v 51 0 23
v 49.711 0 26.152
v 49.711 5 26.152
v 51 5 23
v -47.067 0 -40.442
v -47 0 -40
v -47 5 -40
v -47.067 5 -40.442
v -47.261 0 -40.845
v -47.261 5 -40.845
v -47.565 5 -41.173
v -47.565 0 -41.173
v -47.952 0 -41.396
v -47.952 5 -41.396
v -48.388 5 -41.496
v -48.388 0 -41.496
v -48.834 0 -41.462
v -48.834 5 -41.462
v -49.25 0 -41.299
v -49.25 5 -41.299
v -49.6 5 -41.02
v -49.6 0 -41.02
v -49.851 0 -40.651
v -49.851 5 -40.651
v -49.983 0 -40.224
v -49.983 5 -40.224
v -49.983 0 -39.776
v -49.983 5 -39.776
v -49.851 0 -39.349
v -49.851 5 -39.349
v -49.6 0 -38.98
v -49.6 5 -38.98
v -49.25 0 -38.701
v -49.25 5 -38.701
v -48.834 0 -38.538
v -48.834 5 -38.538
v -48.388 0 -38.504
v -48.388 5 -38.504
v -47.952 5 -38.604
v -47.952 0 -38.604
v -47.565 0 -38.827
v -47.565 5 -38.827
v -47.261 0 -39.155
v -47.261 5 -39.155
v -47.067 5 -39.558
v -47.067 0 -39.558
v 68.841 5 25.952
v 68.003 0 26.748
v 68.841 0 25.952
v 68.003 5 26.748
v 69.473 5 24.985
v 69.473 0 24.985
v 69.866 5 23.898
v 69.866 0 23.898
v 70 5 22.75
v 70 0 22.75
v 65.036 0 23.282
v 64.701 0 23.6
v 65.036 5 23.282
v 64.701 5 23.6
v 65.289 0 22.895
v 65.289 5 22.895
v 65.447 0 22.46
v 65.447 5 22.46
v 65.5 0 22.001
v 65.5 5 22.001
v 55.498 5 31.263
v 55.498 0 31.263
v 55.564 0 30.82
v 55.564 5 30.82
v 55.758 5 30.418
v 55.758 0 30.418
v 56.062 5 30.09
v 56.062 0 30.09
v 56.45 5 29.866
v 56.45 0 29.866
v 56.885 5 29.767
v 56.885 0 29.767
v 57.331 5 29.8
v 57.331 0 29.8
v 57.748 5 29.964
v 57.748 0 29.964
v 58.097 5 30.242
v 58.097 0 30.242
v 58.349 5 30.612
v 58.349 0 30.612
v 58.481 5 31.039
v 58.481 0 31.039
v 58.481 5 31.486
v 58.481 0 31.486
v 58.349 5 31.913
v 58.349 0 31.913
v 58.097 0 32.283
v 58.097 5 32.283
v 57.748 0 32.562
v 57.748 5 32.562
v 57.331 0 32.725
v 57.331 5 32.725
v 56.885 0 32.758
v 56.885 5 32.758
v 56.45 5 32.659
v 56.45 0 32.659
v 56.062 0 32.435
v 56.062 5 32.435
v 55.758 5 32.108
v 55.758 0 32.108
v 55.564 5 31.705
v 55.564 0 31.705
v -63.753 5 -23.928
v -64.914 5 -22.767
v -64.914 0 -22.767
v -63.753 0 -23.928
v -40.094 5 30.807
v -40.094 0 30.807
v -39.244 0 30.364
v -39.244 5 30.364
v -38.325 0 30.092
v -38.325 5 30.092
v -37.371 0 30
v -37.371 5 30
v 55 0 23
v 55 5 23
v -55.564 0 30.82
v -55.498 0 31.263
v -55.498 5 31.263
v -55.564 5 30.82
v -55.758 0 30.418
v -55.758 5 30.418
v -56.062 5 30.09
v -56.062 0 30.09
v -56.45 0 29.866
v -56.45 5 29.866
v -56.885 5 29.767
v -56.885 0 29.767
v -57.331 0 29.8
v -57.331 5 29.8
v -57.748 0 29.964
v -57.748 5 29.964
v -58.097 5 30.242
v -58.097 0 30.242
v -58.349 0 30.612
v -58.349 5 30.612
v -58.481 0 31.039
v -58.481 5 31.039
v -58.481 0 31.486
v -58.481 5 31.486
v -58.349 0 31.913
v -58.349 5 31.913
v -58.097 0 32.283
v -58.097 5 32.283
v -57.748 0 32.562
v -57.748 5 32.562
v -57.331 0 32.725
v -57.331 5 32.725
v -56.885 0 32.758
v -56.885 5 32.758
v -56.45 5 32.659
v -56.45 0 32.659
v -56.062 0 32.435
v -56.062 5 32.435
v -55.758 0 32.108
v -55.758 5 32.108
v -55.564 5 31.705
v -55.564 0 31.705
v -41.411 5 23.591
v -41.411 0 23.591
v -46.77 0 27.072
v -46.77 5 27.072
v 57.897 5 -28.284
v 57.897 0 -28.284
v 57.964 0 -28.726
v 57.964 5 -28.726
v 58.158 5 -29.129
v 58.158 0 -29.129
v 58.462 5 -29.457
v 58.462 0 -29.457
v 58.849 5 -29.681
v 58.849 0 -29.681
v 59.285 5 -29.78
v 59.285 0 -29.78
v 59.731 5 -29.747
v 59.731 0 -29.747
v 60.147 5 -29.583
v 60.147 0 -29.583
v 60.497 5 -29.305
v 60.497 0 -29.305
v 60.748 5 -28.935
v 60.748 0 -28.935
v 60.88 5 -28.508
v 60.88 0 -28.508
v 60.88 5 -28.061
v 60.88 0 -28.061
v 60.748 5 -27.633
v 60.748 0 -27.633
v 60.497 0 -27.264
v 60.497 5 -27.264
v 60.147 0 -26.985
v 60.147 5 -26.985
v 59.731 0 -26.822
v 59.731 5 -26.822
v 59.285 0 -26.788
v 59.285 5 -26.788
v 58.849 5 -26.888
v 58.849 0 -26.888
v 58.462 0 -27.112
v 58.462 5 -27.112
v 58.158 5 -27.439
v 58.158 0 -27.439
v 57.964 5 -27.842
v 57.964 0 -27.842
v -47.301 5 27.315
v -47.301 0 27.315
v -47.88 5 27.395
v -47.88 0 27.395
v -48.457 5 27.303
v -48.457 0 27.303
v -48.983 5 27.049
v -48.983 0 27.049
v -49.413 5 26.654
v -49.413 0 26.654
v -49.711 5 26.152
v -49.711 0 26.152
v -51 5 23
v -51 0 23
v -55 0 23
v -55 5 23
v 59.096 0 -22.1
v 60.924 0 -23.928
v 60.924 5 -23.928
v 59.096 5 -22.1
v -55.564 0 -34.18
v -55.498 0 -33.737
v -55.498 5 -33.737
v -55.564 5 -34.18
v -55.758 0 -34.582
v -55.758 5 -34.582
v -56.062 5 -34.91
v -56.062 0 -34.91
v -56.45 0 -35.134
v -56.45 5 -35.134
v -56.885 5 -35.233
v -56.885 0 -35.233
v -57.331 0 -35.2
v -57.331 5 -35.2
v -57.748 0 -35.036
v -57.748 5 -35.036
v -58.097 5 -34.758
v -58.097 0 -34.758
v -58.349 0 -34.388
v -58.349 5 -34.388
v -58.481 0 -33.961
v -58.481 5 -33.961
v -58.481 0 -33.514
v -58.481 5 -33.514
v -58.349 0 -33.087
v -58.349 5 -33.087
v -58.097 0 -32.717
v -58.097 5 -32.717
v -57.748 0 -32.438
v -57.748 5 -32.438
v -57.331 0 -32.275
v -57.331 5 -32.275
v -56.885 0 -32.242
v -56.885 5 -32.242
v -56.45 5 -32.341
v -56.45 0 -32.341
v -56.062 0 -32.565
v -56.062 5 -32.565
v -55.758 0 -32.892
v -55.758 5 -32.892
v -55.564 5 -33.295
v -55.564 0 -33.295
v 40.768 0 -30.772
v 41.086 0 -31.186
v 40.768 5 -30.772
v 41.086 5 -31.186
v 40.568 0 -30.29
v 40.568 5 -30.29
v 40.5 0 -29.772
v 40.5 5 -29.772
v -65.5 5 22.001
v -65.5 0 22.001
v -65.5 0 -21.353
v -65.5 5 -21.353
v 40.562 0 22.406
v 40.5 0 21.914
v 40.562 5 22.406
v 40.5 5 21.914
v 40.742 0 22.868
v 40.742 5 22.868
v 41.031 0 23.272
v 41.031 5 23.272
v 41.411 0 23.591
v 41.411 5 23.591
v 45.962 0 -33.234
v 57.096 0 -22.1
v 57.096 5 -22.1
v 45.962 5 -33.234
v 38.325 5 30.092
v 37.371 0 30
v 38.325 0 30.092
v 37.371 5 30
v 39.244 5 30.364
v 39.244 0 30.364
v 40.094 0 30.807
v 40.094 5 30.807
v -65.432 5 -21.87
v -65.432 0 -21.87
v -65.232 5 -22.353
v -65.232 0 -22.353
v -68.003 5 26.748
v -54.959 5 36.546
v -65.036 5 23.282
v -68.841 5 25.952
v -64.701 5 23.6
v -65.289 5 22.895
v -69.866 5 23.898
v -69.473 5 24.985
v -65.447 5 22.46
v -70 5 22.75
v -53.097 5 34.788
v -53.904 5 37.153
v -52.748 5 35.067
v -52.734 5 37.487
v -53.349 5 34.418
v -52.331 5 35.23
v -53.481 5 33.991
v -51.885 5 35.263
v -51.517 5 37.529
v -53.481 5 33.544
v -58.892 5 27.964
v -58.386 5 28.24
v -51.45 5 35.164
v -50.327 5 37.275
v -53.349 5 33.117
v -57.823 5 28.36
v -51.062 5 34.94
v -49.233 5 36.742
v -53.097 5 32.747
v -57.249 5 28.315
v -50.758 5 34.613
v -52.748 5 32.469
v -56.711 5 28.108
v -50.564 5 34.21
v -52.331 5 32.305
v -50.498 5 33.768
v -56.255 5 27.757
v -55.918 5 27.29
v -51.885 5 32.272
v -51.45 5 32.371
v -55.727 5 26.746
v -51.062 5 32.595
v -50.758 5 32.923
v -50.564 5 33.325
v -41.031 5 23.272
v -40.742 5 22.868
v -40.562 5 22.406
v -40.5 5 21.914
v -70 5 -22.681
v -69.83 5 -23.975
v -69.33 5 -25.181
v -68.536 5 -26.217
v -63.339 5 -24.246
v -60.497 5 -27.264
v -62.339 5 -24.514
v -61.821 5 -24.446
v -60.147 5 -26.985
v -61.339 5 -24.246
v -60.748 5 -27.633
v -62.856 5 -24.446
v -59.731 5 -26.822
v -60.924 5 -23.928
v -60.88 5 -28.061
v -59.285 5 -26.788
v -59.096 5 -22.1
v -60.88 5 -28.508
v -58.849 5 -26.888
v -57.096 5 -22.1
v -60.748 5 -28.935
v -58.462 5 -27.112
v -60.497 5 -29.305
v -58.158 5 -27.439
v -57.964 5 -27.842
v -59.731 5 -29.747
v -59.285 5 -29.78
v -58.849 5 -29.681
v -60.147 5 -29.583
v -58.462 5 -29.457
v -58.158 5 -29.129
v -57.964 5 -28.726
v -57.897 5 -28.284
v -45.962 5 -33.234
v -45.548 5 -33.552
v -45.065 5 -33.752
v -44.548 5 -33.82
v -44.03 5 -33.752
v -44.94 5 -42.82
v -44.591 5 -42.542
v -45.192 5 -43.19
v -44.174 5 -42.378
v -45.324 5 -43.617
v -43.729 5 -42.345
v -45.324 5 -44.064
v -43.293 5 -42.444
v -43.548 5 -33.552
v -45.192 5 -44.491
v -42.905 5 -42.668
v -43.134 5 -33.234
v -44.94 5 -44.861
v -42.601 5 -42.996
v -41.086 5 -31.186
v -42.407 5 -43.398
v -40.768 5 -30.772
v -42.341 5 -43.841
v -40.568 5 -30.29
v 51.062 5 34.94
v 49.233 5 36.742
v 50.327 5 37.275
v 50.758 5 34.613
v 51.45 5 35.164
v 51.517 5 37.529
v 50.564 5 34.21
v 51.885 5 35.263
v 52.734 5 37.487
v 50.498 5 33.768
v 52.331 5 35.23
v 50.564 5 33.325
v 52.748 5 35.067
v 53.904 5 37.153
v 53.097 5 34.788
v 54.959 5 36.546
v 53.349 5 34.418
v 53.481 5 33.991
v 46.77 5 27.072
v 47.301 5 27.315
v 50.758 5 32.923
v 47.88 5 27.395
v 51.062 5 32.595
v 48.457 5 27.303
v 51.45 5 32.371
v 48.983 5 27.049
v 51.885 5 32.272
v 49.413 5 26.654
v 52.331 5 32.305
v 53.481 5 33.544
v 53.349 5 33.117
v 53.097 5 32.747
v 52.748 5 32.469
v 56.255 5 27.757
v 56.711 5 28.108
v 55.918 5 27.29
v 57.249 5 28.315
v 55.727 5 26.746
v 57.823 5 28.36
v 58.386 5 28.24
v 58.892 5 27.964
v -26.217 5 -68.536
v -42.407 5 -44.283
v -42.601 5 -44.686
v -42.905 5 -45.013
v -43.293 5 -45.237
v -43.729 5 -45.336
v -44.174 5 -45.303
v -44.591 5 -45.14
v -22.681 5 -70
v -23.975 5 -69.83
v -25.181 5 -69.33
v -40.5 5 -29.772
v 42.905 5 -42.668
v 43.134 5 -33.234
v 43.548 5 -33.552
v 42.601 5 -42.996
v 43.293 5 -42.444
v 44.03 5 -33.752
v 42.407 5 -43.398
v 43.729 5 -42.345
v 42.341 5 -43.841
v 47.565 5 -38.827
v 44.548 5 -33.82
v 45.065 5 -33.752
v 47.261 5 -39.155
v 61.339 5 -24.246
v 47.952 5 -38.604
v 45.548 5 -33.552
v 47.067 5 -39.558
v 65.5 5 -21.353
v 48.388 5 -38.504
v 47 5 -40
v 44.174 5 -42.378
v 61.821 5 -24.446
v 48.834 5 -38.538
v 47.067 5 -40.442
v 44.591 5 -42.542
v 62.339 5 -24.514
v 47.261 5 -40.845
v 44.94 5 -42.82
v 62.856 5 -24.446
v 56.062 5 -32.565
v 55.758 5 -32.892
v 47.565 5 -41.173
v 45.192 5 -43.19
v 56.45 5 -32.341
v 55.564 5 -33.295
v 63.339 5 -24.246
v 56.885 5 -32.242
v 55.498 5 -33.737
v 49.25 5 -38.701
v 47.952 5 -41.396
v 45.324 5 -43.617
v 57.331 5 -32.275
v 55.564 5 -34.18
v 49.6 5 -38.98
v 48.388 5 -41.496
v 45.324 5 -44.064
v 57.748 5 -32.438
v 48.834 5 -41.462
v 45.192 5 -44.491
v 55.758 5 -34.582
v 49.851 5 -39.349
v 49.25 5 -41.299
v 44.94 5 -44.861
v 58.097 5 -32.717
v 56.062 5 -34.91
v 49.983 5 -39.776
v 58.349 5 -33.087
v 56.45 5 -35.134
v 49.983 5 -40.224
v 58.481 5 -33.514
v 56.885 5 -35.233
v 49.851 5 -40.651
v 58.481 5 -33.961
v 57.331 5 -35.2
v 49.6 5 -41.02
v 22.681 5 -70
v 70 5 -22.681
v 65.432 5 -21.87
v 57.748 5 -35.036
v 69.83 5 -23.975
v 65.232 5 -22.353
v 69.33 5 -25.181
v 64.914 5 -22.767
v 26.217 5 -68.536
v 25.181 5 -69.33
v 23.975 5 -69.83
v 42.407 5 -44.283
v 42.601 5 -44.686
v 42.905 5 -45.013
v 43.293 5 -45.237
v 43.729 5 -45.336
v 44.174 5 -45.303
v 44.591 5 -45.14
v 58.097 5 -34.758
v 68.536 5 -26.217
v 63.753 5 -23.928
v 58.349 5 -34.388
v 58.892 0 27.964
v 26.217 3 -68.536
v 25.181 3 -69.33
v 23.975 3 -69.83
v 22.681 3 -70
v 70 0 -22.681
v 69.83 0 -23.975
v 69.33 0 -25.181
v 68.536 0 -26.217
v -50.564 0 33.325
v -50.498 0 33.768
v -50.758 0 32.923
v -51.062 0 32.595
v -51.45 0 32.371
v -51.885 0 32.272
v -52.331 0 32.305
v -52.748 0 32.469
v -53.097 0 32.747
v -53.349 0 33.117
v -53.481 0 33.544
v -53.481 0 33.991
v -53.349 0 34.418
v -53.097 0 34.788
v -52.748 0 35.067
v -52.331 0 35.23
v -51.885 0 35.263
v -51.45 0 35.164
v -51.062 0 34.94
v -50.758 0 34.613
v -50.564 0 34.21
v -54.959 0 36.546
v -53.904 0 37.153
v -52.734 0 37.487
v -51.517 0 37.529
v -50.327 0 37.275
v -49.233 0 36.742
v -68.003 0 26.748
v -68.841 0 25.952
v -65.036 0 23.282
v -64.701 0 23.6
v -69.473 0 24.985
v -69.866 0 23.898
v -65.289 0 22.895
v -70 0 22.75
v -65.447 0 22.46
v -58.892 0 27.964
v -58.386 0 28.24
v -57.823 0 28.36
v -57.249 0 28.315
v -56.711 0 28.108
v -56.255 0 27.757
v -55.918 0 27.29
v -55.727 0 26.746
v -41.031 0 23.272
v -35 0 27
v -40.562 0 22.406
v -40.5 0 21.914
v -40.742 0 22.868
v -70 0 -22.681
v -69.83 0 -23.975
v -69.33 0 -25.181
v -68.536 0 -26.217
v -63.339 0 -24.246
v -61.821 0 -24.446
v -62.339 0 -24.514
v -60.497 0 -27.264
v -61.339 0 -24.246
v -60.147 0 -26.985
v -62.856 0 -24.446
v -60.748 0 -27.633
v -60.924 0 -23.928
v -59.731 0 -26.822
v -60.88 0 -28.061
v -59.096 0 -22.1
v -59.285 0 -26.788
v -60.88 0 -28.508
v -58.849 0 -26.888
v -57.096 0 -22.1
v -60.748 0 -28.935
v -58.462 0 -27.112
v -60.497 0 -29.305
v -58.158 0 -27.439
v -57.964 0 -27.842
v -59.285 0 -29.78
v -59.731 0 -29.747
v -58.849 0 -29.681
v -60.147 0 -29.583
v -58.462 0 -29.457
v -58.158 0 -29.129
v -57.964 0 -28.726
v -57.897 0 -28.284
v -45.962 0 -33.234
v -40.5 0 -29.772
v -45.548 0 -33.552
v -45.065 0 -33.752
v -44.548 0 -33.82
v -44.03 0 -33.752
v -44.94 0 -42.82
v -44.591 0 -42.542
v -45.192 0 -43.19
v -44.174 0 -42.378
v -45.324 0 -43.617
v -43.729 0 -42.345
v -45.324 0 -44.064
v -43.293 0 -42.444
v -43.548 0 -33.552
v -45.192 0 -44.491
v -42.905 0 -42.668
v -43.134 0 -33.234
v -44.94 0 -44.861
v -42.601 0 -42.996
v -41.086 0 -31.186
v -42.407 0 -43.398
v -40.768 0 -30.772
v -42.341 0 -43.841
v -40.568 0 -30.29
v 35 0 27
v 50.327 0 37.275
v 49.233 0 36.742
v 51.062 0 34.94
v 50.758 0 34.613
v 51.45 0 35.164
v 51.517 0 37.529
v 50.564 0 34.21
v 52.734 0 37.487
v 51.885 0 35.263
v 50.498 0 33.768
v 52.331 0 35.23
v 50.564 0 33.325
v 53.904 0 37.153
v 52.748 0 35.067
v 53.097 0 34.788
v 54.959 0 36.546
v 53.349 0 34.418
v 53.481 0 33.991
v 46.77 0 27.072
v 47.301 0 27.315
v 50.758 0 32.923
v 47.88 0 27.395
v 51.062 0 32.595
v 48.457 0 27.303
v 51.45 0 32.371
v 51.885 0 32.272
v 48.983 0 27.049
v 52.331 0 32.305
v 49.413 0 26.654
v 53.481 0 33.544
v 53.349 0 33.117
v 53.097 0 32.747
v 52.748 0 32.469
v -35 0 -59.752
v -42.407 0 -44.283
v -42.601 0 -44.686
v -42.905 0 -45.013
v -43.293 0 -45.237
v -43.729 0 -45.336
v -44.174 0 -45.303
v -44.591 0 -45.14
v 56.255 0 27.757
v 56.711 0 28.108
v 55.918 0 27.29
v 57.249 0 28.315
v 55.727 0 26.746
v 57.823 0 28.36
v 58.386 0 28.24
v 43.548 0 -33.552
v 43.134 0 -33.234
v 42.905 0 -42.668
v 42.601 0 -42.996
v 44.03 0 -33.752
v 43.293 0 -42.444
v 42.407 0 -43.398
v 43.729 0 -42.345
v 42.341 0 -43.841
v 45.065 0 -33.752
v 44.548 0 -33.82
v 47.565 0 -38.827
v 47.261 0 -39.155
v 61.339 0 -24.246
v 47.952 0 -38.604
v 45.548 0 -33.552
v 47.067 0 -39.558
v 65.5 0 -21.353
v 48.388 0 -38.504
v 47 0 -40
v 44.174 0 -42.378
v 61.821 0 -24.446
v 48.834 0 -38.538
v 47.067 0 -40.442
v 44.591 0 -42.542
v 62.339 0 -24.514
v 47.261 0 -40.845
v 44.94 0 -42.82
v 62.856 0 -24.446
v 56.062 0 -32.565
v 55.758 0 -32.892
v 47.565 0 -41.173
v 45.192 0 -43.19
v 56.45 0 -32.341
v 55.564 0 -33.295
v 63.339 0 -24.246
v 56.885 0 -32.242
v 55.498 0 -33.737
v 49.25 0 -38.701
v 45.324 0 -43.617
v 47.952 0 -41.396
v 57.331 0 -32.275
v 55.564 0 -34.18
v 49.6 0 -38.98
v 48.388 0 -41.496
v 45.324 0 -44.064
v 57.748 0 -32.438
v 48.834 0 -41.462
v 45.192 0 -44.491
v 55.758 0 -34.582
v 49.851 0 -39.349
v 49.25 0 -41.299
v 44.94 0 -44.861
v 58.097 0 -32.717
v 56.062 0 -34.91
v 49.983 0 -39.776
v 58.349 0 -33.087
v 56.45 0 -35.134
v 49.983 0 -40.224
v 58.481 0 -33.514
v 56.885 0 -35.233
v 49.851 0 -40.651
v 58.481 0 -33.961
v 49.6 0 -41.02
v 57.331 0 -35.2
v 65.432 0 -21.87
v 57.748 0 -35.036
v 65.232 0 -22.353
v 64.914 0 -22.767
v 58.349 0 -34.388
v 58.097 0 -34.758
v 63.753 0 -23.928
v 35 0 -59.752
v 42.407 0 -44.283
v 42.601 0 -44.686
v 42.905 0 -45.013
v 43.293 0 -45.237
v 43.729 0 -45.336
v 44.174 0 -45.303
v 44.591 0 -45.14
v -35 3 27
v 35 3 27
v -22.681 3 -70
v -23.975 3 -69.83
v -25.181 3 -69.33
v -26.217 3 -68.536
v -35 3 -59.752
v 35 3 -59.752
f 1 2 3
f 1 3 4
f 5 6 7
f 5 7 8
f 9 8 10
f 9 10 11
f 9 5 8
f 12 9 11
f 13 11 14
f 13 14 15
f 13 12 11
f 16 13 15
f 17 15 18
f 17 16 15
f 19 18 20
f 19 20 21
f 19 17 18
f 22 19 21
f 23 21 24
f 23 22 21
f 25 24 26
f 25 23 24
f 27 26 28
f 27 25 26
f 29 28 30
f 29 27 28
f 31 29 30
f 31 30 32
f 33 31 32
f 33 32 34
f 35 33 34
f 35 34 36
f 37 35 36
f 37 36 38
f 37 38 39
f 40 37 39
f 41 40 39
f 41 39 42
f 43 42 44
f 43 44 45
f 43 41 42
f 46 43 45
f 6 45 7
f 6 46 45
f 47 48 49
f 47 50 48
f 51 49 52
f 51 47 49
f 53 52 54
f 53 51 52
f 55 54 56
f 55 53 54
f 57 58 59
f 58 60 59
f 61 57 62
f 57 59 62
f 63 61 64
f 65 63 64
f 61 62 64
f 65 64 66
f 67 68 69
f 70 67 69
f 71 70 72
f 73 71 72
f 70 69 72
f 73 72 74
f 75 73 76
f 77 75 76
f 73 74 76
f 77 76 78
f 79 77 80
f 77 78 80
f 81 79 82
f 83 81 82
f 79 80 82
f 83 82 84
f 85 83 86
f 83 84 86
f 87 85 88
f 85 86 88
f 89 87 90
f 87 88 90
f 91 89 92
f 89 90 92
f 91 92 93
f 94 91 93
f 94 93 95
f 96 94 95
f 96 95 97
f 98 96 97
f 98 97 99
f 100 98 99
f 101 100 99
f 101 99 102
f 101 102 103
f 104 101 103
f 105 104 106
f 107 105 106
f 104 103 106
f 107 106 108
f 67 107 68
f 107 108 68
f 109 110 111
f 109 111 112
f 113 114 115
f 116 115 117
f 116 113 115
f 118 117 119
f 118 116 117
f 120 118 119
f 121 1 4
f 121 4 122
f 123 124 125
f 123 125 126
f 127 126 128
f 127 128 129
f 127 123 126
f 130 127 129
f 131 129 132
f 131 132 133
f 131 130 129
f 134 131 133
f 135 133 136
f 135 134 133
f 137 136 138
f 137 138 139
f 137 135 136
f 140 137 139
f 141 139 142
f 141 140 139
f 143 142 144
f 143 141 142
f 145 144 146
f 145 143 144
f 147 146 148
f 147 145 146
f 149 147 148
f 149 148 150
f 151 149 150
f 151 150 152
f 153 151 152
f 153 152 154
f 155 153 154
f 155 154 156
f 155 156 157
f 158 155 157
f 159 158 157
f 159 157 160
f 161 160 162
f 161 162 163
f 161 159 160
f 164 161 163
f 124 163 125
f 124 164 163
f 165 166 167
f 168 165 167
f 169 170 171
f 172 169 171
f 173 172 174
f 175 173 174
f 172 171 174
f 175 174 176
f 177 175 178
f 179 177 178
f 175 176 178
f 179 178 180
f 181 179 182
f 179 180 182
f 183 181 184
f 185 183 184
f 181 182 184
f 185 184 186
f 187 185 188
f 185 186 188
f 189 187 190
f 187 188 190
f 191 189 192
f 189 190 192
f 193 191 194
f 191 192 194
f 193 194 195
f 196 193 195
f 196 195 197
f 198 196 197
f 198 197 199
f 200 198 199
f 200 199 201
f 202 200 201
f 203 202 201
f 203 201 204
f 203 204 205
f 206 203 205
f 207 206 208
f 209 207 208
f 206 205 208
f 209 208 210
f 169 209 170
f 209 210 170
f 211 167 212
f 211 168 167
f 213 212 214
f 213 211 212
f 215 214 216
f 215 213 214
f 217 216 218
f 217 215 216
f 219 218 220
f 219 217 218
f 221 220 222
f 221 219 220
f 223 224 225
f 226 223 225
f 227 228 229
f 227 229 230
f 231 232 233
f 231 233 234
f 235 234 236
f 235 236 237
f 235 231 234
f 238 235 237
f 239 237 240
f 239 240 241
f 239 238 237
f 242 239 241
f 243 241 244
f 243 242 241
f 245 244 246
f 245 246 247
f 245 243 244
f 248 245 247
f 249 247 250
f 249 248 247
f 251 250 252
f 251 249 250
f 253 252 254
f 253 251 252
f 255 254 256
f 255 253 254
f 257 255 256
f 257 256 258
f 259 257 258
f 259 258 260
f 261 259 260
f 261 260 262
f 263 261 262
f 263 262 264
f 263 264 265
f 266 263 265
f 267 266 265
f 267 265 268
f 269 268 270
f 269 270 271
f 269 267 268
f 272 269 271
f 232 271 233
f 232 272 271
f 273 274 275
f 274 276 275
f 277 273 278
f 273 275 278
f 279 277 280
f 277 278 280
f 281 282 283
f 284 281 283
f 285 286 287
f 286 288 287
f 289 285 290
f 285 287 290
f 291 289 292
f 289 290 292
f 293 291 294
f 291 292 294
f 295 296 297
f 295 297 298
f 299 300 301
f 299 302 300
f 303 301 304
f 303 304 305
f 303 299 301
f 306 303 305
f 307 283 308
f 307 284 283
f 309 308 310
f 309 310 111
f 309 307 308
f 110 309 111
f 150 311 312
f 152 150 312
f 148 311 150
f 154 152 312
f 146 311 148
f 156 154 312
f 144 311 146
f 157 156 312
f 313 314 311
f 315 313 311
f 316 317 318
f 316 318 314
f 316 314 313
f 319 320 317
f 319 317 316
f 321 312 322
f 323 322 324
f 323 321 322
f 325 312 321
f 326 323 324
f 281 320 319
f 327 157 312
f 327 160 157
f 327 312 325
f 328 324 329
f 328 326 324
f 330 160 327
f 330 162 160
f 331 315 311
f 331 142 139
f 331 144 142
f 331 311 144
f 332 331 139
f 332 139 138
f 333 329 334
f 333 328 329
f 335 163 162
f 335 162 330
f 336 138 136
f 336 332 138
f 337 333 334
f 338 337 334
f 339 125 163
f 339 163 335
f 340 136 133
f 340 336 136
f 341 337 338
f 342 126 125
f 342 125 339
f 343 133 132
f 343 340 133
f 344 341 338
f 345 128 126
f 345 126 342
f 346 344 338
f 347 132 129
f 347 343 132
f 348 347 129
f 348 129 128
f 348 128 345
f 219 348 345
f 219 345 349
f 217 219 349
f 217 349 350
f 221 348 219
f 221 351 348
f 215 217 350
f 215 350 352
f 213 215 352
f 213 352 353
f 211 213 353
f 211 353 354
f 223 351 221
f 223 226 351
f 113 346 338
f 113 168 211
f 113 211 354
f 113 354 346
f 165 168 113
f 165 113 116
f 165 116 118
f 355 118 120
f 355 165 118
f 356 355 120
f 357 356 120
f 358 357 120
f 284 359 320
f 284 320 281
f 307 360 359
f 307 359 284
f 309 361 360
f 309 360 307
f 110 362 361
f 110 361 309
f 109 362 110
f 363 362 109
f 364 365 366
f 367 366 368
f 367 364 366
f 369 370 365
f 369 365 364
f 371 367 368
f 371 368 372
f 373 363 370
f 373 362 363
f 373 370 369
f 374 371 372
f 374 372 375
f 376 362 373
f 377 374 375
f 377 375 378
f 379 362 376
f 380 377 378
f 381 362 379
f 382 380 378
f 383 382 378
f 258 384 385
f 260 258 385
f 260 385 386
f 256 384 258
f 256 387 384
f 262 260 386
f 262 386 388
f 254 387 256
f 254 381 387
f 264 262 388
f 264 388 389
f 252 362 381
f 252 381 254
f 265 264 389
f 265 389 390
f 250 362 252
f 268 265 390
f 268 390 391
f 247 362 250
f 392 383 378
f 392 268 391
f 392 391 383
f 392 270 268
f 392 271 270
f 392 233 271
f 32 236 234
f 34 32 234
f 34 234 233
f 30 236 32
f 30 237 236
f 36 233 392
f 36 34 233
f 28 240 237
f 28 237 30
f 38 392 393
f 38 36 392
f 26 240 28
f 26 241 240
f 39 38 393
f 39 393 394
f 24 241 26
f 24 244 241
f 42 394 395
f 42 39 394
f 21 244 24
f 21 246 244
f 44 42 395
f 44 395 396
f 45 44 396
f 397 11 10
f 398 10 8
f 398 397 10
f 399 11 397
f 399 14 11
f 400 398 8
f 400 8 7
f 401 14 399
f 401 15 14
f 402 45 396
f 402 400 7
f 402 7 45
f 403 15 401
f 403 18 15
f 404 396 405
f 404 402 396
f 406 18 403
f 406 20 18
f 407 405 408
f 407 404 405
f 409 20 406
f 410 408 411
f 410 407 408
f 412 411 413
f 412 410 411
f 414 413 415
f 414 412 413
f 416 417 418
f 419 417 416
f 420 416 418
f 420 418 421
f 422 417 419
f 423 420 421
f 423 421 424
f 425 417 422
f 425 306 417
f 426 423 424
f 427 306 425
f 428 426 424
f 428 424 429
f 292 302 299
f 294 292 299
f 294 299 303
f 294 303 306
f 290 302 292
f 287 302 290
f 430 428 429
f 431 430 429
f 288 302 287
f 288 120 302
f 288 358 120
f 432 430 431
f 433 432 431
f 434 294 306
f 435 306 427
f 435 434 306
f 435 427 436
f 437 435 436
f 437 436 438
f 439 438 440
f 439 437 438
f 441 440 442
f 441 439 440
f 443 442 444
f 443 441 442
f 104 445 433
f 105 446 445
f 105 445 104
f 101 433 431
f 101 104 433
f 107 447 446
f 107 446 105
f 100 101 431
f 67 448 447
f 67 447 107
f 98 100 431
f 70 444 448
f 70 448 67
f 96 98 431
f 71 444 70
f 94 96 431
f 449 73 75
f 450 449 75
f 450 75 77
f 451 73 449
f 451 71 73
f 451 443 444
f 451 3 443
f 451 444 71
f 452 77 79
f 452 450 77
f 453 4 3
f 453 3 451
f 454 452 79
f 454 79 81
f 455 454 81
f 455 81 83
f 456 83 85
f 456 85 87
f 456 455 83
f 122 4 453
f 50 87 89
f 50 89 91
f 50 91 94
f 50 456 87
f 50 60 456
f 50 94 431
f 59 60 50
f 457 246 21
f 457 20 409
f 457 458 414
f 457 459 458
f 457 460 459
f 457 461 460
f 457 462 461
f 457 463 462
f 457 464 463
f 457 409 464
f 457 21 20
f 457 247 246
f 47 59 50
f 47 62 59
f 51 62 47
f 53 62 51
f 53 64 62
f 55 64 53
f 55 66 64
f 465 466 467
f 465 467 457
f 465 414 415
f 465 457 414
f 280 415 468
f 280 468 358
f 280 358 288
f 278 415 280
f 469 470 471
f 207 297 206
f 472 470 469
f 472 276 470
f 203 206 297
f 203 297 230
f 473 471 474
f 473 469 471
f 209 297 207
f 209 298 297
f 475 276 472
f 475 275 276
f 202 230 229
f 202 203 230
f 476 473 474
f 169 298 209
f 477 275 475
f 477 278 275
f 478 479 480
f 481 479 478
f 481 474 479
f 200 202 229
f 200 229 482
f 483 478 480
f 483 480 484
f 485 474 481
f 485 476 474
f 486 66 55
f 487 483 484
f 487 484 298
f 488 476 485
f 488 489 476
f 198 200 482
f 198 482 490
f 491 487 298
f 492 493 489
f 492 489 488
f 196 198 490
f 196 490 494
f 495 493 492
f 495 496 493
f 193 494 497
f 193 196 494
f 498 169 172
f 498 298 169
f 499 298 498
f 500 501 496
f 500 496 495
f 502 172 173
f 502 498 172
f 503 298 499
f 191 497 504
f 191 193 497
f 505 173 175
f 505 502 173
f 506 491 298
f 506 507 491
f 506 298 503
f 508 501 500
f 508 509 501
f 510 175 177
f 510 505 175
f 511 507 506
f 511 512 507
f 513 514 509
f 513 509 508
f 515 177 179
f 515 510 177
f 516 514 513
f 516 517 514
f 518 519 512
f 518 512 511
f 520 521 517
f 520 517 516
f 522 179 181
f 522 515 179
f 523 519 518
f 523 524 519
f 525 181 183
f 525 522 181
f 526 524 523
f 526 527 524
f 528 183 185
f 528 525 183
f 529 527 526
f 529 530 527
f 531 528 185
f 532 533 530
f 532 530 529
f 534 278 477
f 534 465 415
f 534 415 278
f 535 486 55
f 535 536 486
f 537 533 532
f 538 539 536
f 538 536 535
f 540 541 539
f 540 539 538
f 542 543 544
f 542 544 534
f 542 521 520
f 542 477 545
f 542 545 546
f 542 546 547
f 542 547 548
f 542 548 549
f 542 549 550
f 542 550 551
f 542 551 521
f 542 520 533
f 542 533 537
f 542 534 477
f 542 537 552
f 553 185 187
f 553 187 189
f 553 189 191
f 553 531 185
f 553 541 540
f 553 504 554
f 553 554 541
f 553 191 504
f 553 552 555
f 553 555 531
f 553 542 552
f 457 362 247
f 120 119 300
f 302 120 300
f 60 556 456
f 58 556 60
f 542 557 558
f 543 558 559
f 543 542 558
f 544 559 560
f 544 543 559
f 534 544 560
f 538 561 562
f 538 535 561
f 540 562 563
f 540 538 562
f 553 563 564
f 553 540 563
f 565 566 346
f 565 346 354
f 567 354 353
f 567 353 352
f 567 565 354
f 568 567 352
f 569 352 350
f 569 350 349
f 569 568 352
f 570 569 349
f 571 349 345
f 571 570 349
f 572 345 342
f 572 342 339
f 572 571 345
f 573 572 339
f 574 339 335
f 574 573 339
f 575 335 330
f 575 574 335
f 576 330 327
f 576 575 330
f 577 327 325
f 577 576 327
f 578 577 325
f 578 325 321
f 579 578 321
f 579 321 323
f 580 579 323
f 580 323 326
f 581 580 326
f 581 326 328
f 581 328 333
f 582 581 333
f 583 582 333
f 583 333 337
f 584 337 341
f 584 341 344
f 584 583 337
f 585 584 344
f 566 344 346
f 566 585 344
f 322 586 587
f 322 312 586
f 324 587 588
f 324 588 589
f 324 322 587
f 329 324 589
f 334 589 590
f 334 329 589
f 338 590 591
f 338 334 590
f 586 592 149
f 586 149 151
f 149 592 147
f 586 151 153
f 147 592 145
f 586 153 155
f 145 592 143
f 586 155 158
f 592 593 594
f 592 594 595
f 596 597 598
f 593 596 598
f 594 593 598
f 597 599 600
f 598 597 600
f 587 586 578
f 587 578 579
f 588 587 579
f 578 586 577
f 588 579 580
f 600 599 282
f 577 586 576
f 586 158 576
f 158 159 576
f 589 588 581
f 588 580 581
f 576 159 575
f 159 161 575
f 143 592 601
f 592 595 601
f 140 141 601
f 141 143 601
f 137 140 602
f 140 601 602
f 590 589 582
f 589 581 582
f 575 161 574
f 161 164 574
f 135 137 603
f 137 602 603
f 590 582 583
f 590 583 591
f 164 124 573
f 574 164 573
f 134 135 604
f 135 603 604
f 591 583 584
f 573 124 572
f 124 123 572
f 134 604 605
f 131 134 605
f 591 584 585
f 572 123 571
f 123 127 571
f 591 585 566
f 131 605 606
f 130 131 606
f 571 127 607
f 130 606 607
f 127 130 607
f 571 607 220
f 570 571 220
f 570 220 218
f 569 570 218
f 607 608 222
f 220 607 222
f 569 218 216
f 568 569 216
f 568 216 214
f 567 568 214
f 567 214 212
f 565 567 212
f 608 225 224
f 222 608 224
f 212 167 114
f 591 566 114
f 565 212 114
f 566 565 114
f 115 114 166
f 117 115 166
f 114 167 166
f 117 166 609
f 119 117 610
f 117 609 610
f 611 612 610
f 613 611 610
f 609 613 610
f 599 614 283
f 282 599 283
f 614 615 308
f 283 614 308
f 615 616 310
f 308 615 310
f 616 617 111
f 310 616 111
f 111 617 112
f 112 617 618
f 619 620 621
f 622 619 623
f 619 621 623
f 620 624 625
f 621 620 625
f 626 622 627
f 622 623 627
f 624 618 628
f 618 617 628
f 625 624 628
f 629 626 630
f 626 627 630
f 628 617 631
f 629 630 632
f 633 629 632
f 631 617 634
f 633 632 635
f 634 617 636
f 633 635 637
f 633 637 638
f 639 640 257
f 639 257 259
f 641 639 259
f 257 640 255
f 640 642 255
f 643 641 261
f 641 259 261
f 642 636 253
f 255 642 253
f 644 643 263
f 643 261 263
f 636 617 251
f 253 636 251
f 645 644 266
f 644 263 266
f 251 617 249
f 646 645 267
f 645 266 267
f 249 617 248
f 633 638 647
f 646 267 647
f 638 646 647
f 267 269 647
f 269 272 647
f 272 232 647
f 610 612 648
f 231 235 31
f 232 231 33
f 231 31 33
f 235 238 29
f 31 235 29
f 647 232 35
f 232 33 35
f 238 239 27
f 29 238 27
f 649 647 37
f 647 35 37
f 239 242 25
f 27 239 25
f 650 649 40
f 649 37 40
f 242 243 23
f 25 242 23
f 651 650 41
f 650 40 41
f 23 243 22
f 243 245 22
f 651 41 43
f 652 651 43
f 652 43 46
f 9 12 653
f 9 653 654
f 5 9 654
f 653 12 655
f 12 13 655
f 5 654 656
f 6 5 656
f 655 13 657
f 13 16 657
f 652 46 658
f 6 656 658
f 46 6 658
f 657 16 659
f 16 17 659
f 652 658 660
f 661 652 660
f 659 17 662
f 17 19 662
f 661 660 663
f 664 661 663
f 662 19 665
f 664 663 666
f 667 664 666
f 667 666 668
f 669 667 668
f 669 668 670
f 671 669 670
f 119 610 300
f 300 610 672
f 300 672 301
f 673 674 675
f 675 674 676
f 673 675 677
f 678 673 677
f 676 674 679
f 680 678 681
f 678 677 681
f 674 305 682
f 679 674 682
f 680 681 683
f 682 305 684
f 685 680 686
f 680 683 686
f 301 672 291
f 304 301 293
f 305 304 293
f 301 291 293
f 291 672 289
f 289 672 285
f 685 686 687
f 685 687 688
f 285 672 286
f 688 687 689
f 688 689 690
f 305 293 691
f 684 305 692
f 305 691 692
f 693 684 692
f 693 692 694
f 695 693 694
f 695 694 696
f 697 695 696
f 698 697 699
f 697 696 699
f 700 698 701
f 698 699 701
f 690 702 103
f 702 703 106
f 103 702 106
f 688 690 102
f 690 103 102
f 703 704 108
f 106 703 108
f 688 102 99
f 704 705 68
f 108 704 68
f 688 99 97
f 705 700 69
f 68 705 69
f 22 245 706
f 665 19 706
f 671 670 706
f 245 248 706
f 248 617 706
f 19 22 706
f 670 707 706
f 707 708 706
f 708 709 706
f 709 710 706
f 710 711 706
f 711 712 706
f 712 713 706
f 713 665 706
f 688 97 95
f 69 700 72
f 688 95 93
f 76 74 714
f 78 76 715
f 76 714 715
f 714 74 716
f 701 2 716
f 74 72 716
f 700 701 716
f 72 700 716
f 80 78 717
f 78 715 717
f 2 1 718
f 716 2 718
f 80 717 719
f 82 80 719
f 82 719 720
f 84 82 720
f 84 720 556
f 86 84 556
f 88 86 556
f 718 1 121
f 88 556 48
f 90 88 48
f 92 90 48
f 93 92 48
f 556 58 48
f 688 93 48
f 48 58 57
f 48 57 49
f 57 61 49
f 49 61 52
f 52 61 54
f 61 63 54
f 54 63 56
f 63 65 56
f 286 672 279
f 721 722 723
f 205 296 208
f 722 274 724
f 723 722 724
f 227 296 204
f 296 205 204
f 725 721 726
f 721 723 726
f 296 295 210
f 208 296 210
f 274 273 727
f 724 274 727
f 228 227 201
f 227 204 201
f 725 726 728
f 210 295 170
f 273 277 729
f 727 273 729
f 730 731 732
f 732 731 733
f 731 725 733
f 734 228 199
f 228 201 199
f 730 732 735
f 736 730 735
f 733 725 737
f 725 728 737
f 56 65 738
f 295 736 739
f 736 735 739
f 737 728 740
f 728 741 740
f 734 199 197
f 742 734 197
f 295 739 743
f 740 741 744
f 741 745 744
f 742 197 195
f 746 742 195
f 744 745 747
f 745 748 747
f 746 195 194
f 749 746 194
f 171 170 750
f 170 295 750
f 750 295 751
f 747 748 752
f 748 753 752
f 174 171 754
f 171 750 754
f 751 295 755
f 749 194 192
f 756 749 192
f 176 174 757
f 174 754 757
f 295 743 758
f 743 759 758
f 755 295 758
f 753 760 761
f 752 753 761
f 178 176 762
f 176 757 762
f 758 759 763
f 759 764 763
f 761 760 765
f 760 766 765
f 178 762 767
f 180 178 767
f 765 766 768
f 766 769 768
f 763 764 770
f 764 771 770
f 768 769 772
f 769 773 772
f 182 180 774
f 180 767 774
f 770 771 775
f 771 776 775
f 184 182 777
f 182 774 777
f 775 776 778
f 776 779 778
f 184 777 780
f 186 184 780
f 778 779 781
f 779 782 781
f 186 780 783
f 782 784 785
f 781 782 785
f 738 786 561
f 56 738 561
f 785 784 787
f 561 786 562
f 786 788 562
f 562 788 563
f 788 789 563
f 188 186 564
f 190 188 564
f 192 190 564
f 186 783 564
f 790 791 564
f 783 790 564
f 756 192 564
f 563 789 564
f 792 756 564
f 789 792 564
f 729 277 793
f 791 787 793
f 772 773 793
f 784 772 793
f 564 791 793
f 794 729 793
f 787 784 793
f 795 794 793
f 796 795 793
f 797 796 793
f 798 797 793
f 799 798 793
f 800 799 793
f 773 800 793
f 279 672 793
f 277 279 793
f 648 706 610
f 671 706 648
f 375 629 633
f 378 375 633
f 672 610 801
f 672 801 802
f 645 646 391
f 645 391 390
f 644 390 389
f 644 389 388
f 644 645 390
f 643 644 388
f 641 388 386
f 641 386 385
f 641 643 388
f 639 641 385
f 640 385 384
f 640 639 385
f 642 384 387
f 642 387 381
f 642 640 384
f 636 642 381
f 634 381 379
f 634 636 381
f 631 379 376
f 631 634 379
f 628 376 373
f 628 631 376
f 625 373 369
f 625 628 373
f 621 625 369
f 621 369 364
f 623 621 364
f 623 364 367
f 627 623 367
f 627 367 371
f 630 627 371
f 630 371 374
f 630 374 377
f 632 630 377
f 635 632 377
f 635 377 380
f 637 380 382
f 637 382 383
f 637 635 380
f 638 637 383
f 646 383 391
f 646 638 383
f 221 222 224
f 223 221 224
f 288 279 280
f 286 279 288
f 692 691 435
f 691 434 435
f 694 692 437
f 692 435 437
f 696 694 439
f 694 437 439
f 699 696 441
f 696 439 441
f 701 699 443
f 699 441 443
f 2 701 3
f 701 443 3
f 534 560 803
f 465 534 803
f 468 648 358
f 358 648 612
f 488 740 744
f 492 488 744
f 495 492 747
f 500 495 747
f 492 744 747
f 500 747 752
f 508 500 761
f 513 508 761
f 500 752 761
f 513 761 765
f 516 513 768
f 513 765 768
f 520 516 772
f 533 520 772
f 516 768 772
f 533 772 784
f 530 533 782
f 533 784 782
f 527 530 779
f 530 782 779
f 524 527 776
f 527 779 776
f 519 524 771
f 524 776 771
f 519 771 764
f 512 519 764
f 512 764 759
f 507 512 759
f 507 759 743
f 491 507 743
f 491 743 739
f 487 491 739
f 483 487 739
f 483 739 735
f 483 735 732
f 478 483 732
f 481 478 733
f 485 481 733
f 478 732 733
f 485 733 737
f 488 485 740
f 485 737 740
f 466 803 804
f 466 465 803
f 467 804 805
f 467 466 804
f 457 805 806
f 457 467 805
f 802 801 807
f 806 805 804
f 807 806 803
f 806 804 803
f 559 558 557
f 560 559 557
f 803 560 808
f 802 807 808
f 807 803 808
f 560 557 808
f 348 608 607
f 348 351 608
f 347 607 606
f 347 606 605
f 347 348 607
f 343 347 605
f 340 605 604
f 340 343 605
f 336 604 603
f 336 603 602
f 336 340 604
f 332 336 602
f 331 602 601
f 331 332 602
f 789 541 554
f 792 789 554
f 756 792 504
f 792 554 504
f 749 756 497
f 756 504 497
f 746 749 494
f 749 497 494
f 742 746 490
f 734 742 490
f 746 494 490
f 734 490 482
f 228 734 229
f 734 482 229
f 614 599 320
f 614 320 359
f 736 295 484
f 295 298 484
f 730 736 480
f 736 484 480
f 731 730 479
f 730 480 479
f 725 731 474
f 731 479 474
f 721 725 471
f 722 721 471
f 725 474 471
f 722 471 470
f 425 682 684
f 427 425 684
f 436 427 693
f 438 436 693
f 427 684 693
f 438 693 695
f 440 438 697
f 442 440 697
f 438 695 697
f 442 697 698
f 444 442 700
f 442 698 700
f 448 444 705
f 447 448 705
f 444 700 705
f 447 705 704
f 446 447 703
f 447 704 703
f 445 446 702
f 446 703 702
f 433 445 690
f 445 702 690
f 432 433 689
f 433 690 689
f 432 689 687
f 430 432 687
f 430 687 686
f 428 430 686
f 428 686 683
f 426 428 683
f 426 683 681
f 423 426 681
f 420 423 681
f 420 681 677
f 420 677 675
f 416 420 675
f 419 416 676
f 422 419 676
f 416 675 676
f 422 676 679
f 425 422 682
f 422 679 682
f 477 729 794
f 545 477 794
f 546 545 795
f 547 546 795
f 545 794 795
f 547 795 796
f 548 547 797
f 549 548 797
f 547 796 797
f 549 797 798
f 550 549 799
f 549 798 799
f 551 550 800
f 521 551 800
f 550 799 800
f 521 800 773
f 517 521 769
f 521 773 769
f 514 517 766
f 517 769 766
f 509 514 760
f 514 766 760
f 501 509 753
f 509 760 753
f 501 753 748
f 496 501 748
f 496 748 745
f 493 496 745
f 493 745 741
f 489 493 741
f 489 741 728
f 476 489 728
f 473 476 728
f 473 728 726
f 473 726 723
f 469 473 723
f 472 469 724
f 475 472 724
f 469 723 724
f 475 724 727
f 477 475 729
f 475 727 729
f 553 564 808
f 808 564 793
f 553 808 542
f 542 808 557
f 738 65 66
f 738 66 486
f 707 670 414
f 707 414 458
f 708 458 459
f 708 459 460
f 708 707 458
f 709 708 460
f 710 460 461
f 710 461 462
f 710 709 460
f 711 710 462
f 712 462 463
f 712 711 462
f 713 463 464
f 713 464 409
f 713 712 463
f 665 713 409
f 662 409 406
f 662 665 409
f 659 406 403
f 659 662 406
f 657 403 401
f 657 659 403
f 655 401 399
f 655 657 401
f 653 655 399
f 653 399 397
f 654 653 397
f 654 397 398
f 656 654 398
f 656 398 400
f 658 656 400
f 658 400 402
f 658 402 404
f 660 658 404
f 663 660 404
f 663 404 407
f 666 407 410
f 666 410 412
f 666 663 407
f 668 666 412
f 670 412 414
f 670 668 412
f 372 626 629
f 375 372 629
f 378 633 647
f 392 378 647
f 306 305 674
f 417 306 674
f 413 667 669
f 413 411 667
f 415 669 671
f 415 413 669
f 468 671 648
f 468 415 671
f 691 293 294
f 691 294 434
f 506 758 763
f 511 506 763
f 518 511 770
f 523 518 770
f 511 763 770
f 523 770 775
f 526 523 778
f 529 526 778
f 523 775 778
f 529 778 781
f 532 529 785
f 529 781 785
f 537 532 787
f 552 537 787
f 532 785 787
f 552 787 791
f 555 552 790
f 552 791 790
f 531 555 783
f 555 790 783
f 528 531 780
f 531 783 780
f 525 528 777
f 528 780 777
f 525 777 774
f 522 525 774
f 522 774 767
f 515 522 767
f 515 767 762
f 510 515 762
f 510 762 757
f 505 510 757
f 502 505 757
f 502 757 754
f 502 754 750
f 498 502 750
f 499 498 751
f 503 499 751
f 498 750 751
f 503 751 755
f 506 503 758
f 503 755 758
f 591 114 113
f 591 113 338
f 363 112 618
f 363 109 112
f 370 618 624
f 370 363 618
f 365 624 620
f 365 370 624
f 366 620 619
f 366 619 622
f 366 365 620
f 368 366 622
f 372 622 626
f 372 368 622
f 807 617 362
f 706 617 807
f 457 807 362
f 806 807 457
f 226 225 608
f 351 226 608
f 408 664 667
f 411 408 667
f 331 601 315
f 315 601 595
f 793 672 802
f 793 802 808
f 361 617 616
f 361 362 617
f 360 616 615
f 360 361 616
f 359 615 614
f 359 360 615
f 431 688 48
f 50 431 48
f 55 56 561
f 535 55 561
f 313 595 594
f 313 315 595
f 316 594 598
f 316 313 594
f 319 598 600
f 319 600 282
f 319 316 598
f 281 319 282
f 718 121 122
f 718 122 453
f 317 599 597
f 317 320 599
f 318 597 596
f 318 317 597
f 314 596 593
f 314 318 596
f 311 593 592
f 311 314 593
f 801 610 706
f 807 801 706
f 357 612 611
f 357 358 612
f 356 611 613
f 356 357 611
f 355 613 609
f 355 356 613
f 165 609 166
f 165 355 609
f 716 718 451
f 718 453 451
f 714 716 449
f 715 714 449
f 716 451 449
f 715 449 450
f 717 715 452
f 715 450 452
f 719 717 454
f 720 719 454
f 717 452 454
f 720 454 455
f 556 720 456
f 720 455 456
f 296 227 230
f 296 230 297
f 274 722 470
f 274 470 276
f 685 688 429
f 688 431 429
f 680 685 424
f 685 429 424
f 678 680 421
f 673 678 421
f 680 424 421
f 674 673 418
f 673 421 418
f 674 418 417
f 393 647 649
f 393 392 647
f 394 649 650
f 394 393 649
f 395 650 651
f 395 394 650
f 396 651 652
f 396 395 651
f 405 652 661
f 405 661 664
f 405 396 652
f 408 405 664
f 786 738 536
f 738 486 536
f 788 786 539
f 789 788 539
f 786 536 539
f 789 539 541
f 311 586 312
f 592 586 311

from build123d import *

# Parameters (mm, degrees)
SKETCH1_R            = 1.5
BOSS_EXTRUDE1_DEPTH  = 5
FILLET1_R            = 2
FILLET1_OF_MIRROR1_R = 2
SKETCH2_W            = 70
SKETCH2_H            = 97
CUT_EXTRUDE1_DEPTH   = 3
FILLET2_R            = 5


with BuildPart() as part:
    # Sketch1 → Boss-Extrude1 (new body)
    with BuildSketch(Plane(origin=(0, 0, 0), x_dir=(1, 0, 0), z_dir=(0, 1, 0))):
        Polygon((-52.164149312, -38.645247828), (-70, -25.247940817), (-70, 24.752308679), (-24.752308679, 70), (0, 70), (0, -30), (-38.851635079, -30), align=None)
        with Locations((-43.840620434, 43.840620434)):
            Circle(SKETCH1_R, mode=Mode.SUBTRACT)
        with Locations((-51.997575213, -33.767620171)):
            Circle(SKETCH1_R, mode=Mode.SUBTRACT)
        with Locations((-59.39696962, 28.284271247)):
            Circle(SKETCH1_R, mode=Mode.SUBTRACT)
        with Locations((-56.997575213, 33.73741674)):
            Circle(SKETCH1_R, mode=Mode.SUBTRACT)
        with Locations((-56.997575213, -31.26258326)):
            Circle(SKETCH1_R, mode=Mode.SUBTRACT)
        with Locations((-48.5, 40)):
            Circle(SKETCH1_R, mode=Mode.SUBTRACT)
        Polygon((-59.095959493, 22.1), (-57.095959493, 22.1), (-44.547727215, 34.648232278), (-40.5, 30.600505063), (-40.5, -23), (-48.796166422, -28.387593469), (-51, -23), (-55, -23), (-56.33662338, -29.883022962), (-65.5, -23), (-65.5, 22.181240867), (-62.33860018, 25.342640687), align=None, mode=Mode.SUBTRACT)
    boss_extrude1 = extrude(amount=BOSS_EXTRUDE1_DEPTH)

    # Fillet1
    fillet1_edges = [part.edges().sort_by_distance(p)[0] for p in [
        (-44.547727215, 2.5, -34.648232278),
        (-62.33860018, 2.5, -25.342640687),
        (-65.5, 2.5, -22.181240867),
        (-65.5, 2.5, 23),
        (-56.33662338, 2.5, 29.883022962),
        (-48.796166422, 2.5, 28.387593469),
        (-40.5, 2.5, 23),
        (-40.5, 2.5, -30.600505063),
    ]]
    fillet(fillet1_edges, radius=FILLET1_R)

    # Mirror1: Boss-Extrude1 across plane
    add(boss_extrude1.mirror(Plane(origin=(0, 5, 30), x_dir=(0, 0, 1), z_dir=(-1, 0, 0))))

    # Fillet1 of Mirror1
    fillet1_of_mirror1_edges = [part.edges().sort_by_distance(p)[0] for p in [
        (44.547727215, 2.5, -34.648232278),
        (62.33860018, 2.5, -25.342640687),
        (65.5, 2.5, -22.181240867),
        (65.5, 2.5, 23),
        (56.33662338, 2.5, 29.883022962),
        (48.796166422, 2.5, 28.387593469),
        (40.5, 2.5, 23),
        (40.5, 2.5, -30.600505063),
    ]]
    fillet(fillet1_of_mirror1_edges, radius=FILLET1_OF_MIRROR1_R)

    # Sketch2 → Cut-Extrude1 (cut)
    with BuildSketch(Plane(origin=(0, 0, 0), x_dir=(1, 0, 0), z_dir=(0, 1, 0))):
        with Locations((0, 21.5)):
            Rectangle(SKETCH2_W, SKETCH2_H)
    extrude(amount=CUT_EXTRUDE1_DEPTH, mode=Mode.SUBTRACT)

    # Fillet2
    fillet2_edges = [part.edges().sort_by_distance(p)[0] for p in [
        (-70, 2.5, -24.752308679),
        (-24.752308679, 4, -70),
        (-38.851635079, 2.5, 30),
        (-52.164149312, 2.5, 38.645247828),
        (-70, 2.5, 25.247940817),
        (70, 2.5, 25.247940817),
        (70, 2.5, -24.752308679),
        (24.752308679, 4, -70),
        (38.851635079, 2.5, 30),
        (52.164149312, 2.5, 38.645247828),
    ]]
    fillet(fillet2_edges, radius=FILLET2_R)


solid = part.part
